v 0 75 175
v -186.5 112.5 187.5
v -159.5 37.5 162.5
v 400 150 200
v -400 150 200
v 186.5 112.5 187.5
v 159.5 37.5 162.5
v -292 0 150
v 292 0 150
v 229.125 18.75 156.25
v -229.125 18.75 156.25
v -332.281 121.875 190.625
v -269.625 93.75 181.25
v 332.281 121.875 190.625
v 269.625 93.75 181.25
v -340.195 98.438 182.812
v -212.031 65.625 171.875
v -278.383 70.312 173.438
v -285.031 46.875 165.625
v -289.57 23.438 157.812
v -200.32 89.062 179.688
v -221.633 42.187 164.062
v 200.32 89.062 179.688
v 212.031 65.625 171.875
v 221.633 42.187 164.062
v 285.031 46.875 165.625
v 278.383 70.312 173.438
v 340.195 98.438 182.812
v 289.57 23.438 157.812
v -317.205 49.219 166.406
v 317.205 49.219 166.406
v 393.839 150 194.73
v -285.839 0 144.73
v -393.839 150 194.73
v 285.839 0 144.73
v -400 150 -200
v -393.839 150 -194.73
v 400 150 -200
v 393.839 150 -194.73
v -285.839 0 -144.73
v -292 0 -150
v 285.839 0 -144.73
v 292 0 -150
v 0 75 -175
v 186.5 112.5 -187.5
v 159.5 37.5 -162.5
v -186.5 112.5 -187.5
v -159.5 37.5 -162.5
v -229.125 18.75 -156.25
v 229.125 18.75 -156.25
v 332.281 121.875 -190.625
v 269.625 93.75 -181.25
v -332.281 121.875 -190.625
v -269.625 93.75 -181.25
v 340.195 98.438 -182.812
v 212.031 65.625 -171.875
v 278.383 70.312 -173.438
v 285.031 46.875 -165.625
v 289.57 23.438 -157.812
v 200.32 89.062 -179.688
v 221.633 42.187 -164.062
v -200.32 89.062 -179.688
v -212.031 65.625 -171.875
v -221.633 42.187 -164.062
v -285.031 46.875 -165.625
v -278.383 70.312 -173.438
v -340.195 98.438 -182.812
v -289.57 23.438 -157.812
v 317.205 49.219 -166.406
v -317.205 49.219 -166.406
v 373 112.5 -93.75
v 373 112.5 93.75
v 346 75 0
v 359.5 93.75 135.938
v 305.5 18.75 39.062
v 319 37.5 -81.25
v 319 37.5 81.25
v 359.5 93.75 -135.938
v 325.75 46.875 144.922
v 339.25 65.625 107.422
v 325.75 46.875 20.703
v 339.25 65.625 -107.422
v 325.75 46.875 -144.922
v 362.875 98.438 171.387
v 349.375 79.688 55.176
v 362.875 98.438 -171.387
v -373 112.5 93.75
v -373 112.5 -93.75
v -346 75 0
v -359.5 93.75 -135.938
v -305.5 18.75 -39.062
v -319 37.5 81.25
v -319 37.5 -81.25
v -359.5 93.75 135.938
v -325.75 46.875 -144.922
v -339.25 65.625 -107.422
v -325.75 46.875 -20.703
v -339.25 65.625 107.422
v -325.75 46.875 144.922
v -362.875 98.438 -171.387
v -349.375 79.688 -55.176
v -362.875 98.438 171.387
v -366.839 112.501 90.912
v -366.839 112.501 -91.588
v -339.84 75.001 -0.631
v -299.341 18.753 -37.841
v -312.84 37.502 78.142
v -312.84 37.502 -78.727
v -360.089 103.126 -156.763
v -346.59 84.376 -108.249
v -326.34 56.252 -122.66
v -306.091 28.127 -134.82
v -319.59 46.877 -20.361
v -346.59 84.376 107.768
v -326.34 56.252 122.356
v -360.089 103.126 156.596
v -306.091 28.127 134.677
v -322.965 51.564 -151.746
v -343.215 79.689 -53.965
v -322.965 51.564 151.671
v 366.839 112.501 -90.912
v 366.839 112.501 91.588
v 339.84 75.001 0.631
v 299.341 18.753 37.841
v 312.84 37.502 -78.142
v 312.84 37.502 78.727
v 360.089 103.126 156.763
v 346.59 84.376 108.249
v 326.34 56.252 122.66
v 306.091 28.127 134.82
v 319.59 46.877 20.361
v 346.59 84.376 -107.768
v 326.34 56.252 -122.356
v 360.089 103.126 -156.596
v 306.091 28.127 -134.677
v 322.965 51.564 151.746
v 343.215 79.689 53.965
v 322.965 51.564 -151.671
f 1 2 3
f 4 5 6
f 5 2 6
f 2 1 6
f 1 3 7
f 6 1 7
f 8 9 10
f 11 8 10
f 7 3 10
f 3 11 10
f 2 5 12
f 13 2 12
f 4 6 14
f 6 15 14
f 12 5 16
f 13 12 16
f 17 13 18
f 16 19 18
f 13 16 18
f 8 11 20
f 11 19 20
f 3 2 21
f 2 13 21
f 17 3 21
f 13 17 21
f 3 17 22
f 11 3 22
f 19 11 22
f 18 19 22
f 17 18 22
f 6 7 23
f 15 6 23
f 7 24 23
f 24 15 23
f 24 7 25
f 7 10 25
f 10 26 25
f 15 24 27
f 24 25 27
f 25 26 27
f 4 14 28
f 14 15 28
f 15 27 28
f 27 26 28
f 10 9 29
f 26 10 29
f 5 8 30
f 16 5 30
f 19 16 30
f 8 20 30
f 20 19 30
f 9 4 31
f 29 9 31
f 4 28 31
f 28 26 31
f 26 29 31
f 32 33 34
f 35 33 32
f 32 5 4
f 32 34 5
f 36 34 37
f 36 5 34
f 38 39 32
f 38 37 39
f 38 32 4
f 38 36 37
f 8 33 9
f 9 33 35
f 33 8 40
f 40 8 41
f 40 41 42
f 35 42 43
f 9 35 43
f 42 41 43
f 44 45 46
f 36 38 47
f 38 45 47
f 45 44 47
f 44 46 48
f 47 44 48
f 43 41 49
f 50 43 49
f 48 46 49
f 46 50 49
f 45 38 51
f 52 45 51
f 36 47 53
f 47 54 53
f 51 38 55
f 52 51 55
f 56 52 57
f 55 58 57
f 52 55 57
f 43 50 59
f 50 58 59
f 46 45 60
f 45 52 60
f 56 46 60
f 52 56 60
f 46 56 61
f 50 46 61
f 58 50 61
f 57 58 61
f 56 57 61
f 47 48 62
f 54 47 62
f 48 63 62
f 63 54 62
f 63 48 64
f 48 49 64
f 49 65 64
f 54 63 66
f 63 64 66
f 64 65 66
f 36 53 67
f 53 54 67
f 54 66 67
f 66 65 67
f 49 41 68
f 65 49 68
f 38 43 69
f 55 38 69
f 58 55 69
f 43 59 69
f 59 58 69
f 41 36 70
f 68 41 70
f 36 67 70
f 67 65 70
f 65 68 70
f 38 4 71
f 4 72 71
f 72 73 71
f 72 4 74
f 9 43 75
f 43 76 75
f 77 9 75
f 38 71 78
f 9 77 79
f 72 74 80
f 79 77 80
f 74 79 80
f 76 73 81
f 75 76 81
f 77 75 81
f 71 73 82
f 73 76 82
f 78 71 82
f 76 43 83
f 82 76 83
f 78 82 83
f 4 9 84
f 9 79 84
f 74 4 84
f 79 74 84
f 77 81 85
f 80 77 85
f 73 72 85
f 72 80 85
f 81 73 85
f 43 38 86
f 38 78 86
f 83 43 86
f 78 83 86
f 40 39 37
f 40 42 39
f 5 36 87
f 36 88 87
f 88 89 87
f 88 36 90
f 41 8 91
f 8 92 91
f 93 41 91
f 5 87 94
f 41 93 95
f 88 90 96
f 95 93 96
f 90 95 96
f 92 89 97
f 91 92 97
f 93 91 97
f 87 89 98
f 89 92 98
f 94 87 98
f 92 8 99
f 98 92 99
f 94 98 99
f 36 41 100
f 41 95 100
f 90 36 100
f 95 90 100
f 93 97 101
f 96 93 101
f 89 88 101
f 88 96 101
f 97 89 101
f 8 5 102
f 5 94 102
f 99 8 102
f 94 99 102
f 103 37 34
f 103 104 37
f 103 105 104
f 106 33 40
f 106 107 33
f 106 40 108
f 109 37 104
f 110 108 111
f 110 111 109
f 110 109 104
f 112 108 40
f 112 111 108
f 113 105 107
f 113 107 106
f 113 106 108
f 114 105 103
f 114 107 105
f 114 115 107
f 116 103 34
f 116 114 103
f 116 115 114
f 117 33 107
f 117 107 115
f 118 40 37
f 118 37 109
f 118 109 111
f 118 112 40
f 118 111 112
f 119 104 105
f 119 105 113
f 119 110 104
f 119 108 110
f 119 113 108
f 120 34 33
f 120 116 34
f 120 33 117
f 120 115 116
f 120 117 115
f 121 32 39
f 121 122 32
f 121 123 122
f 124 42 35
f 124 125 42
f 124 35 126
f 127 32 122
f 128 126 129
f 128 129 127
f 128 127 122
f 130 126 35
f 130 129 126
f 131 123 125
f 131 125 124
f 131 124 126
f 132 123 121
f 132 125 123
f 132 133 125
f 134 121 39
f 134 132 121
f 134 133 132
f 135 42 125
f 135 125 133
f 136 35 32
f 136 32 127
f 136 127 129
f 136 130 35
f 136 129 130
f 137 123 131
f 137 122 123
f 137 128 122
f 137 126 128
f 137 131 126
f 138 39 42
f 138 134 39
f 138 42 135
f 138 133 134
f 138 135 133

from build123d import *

# Parameters (mm, degrees)
SKETCH2_W = 800
SKETCH2_H = 400
SKETCH1_W = 584
SKETCH1_H = 300
SHELL1_T  = -5


with BuildPart() as part:
    # Sketch2 → Loft1 section 0
    with BuildSketch(Plane(origin=(0, 150, 0), x_dir=(1, 0, 0), z_dir=(0, 1, 0))):
        Rectangle(SKETCH2_W, SKETCH2_H)
    # Sketch1 → Loft1 section 1
    with BuildSketch(Plane(origin=(0, 0, 0), x_dir=(1, 0, 0), z_dir=(0, 1, 0))):
        Rectangle(SKETCH1_W, SKETCH1_H)
    loft()

    # Shell1
    shell1_openings = [part.faces().sort_by_distance(p)[0] for p in [
        (0, 0, 0),
        (0, 150, 0),
    ]]
    offset(amount=SHELL1_T, openings=shell1_openings, kind=Kind.INTERSECTION)


solid = part.part
